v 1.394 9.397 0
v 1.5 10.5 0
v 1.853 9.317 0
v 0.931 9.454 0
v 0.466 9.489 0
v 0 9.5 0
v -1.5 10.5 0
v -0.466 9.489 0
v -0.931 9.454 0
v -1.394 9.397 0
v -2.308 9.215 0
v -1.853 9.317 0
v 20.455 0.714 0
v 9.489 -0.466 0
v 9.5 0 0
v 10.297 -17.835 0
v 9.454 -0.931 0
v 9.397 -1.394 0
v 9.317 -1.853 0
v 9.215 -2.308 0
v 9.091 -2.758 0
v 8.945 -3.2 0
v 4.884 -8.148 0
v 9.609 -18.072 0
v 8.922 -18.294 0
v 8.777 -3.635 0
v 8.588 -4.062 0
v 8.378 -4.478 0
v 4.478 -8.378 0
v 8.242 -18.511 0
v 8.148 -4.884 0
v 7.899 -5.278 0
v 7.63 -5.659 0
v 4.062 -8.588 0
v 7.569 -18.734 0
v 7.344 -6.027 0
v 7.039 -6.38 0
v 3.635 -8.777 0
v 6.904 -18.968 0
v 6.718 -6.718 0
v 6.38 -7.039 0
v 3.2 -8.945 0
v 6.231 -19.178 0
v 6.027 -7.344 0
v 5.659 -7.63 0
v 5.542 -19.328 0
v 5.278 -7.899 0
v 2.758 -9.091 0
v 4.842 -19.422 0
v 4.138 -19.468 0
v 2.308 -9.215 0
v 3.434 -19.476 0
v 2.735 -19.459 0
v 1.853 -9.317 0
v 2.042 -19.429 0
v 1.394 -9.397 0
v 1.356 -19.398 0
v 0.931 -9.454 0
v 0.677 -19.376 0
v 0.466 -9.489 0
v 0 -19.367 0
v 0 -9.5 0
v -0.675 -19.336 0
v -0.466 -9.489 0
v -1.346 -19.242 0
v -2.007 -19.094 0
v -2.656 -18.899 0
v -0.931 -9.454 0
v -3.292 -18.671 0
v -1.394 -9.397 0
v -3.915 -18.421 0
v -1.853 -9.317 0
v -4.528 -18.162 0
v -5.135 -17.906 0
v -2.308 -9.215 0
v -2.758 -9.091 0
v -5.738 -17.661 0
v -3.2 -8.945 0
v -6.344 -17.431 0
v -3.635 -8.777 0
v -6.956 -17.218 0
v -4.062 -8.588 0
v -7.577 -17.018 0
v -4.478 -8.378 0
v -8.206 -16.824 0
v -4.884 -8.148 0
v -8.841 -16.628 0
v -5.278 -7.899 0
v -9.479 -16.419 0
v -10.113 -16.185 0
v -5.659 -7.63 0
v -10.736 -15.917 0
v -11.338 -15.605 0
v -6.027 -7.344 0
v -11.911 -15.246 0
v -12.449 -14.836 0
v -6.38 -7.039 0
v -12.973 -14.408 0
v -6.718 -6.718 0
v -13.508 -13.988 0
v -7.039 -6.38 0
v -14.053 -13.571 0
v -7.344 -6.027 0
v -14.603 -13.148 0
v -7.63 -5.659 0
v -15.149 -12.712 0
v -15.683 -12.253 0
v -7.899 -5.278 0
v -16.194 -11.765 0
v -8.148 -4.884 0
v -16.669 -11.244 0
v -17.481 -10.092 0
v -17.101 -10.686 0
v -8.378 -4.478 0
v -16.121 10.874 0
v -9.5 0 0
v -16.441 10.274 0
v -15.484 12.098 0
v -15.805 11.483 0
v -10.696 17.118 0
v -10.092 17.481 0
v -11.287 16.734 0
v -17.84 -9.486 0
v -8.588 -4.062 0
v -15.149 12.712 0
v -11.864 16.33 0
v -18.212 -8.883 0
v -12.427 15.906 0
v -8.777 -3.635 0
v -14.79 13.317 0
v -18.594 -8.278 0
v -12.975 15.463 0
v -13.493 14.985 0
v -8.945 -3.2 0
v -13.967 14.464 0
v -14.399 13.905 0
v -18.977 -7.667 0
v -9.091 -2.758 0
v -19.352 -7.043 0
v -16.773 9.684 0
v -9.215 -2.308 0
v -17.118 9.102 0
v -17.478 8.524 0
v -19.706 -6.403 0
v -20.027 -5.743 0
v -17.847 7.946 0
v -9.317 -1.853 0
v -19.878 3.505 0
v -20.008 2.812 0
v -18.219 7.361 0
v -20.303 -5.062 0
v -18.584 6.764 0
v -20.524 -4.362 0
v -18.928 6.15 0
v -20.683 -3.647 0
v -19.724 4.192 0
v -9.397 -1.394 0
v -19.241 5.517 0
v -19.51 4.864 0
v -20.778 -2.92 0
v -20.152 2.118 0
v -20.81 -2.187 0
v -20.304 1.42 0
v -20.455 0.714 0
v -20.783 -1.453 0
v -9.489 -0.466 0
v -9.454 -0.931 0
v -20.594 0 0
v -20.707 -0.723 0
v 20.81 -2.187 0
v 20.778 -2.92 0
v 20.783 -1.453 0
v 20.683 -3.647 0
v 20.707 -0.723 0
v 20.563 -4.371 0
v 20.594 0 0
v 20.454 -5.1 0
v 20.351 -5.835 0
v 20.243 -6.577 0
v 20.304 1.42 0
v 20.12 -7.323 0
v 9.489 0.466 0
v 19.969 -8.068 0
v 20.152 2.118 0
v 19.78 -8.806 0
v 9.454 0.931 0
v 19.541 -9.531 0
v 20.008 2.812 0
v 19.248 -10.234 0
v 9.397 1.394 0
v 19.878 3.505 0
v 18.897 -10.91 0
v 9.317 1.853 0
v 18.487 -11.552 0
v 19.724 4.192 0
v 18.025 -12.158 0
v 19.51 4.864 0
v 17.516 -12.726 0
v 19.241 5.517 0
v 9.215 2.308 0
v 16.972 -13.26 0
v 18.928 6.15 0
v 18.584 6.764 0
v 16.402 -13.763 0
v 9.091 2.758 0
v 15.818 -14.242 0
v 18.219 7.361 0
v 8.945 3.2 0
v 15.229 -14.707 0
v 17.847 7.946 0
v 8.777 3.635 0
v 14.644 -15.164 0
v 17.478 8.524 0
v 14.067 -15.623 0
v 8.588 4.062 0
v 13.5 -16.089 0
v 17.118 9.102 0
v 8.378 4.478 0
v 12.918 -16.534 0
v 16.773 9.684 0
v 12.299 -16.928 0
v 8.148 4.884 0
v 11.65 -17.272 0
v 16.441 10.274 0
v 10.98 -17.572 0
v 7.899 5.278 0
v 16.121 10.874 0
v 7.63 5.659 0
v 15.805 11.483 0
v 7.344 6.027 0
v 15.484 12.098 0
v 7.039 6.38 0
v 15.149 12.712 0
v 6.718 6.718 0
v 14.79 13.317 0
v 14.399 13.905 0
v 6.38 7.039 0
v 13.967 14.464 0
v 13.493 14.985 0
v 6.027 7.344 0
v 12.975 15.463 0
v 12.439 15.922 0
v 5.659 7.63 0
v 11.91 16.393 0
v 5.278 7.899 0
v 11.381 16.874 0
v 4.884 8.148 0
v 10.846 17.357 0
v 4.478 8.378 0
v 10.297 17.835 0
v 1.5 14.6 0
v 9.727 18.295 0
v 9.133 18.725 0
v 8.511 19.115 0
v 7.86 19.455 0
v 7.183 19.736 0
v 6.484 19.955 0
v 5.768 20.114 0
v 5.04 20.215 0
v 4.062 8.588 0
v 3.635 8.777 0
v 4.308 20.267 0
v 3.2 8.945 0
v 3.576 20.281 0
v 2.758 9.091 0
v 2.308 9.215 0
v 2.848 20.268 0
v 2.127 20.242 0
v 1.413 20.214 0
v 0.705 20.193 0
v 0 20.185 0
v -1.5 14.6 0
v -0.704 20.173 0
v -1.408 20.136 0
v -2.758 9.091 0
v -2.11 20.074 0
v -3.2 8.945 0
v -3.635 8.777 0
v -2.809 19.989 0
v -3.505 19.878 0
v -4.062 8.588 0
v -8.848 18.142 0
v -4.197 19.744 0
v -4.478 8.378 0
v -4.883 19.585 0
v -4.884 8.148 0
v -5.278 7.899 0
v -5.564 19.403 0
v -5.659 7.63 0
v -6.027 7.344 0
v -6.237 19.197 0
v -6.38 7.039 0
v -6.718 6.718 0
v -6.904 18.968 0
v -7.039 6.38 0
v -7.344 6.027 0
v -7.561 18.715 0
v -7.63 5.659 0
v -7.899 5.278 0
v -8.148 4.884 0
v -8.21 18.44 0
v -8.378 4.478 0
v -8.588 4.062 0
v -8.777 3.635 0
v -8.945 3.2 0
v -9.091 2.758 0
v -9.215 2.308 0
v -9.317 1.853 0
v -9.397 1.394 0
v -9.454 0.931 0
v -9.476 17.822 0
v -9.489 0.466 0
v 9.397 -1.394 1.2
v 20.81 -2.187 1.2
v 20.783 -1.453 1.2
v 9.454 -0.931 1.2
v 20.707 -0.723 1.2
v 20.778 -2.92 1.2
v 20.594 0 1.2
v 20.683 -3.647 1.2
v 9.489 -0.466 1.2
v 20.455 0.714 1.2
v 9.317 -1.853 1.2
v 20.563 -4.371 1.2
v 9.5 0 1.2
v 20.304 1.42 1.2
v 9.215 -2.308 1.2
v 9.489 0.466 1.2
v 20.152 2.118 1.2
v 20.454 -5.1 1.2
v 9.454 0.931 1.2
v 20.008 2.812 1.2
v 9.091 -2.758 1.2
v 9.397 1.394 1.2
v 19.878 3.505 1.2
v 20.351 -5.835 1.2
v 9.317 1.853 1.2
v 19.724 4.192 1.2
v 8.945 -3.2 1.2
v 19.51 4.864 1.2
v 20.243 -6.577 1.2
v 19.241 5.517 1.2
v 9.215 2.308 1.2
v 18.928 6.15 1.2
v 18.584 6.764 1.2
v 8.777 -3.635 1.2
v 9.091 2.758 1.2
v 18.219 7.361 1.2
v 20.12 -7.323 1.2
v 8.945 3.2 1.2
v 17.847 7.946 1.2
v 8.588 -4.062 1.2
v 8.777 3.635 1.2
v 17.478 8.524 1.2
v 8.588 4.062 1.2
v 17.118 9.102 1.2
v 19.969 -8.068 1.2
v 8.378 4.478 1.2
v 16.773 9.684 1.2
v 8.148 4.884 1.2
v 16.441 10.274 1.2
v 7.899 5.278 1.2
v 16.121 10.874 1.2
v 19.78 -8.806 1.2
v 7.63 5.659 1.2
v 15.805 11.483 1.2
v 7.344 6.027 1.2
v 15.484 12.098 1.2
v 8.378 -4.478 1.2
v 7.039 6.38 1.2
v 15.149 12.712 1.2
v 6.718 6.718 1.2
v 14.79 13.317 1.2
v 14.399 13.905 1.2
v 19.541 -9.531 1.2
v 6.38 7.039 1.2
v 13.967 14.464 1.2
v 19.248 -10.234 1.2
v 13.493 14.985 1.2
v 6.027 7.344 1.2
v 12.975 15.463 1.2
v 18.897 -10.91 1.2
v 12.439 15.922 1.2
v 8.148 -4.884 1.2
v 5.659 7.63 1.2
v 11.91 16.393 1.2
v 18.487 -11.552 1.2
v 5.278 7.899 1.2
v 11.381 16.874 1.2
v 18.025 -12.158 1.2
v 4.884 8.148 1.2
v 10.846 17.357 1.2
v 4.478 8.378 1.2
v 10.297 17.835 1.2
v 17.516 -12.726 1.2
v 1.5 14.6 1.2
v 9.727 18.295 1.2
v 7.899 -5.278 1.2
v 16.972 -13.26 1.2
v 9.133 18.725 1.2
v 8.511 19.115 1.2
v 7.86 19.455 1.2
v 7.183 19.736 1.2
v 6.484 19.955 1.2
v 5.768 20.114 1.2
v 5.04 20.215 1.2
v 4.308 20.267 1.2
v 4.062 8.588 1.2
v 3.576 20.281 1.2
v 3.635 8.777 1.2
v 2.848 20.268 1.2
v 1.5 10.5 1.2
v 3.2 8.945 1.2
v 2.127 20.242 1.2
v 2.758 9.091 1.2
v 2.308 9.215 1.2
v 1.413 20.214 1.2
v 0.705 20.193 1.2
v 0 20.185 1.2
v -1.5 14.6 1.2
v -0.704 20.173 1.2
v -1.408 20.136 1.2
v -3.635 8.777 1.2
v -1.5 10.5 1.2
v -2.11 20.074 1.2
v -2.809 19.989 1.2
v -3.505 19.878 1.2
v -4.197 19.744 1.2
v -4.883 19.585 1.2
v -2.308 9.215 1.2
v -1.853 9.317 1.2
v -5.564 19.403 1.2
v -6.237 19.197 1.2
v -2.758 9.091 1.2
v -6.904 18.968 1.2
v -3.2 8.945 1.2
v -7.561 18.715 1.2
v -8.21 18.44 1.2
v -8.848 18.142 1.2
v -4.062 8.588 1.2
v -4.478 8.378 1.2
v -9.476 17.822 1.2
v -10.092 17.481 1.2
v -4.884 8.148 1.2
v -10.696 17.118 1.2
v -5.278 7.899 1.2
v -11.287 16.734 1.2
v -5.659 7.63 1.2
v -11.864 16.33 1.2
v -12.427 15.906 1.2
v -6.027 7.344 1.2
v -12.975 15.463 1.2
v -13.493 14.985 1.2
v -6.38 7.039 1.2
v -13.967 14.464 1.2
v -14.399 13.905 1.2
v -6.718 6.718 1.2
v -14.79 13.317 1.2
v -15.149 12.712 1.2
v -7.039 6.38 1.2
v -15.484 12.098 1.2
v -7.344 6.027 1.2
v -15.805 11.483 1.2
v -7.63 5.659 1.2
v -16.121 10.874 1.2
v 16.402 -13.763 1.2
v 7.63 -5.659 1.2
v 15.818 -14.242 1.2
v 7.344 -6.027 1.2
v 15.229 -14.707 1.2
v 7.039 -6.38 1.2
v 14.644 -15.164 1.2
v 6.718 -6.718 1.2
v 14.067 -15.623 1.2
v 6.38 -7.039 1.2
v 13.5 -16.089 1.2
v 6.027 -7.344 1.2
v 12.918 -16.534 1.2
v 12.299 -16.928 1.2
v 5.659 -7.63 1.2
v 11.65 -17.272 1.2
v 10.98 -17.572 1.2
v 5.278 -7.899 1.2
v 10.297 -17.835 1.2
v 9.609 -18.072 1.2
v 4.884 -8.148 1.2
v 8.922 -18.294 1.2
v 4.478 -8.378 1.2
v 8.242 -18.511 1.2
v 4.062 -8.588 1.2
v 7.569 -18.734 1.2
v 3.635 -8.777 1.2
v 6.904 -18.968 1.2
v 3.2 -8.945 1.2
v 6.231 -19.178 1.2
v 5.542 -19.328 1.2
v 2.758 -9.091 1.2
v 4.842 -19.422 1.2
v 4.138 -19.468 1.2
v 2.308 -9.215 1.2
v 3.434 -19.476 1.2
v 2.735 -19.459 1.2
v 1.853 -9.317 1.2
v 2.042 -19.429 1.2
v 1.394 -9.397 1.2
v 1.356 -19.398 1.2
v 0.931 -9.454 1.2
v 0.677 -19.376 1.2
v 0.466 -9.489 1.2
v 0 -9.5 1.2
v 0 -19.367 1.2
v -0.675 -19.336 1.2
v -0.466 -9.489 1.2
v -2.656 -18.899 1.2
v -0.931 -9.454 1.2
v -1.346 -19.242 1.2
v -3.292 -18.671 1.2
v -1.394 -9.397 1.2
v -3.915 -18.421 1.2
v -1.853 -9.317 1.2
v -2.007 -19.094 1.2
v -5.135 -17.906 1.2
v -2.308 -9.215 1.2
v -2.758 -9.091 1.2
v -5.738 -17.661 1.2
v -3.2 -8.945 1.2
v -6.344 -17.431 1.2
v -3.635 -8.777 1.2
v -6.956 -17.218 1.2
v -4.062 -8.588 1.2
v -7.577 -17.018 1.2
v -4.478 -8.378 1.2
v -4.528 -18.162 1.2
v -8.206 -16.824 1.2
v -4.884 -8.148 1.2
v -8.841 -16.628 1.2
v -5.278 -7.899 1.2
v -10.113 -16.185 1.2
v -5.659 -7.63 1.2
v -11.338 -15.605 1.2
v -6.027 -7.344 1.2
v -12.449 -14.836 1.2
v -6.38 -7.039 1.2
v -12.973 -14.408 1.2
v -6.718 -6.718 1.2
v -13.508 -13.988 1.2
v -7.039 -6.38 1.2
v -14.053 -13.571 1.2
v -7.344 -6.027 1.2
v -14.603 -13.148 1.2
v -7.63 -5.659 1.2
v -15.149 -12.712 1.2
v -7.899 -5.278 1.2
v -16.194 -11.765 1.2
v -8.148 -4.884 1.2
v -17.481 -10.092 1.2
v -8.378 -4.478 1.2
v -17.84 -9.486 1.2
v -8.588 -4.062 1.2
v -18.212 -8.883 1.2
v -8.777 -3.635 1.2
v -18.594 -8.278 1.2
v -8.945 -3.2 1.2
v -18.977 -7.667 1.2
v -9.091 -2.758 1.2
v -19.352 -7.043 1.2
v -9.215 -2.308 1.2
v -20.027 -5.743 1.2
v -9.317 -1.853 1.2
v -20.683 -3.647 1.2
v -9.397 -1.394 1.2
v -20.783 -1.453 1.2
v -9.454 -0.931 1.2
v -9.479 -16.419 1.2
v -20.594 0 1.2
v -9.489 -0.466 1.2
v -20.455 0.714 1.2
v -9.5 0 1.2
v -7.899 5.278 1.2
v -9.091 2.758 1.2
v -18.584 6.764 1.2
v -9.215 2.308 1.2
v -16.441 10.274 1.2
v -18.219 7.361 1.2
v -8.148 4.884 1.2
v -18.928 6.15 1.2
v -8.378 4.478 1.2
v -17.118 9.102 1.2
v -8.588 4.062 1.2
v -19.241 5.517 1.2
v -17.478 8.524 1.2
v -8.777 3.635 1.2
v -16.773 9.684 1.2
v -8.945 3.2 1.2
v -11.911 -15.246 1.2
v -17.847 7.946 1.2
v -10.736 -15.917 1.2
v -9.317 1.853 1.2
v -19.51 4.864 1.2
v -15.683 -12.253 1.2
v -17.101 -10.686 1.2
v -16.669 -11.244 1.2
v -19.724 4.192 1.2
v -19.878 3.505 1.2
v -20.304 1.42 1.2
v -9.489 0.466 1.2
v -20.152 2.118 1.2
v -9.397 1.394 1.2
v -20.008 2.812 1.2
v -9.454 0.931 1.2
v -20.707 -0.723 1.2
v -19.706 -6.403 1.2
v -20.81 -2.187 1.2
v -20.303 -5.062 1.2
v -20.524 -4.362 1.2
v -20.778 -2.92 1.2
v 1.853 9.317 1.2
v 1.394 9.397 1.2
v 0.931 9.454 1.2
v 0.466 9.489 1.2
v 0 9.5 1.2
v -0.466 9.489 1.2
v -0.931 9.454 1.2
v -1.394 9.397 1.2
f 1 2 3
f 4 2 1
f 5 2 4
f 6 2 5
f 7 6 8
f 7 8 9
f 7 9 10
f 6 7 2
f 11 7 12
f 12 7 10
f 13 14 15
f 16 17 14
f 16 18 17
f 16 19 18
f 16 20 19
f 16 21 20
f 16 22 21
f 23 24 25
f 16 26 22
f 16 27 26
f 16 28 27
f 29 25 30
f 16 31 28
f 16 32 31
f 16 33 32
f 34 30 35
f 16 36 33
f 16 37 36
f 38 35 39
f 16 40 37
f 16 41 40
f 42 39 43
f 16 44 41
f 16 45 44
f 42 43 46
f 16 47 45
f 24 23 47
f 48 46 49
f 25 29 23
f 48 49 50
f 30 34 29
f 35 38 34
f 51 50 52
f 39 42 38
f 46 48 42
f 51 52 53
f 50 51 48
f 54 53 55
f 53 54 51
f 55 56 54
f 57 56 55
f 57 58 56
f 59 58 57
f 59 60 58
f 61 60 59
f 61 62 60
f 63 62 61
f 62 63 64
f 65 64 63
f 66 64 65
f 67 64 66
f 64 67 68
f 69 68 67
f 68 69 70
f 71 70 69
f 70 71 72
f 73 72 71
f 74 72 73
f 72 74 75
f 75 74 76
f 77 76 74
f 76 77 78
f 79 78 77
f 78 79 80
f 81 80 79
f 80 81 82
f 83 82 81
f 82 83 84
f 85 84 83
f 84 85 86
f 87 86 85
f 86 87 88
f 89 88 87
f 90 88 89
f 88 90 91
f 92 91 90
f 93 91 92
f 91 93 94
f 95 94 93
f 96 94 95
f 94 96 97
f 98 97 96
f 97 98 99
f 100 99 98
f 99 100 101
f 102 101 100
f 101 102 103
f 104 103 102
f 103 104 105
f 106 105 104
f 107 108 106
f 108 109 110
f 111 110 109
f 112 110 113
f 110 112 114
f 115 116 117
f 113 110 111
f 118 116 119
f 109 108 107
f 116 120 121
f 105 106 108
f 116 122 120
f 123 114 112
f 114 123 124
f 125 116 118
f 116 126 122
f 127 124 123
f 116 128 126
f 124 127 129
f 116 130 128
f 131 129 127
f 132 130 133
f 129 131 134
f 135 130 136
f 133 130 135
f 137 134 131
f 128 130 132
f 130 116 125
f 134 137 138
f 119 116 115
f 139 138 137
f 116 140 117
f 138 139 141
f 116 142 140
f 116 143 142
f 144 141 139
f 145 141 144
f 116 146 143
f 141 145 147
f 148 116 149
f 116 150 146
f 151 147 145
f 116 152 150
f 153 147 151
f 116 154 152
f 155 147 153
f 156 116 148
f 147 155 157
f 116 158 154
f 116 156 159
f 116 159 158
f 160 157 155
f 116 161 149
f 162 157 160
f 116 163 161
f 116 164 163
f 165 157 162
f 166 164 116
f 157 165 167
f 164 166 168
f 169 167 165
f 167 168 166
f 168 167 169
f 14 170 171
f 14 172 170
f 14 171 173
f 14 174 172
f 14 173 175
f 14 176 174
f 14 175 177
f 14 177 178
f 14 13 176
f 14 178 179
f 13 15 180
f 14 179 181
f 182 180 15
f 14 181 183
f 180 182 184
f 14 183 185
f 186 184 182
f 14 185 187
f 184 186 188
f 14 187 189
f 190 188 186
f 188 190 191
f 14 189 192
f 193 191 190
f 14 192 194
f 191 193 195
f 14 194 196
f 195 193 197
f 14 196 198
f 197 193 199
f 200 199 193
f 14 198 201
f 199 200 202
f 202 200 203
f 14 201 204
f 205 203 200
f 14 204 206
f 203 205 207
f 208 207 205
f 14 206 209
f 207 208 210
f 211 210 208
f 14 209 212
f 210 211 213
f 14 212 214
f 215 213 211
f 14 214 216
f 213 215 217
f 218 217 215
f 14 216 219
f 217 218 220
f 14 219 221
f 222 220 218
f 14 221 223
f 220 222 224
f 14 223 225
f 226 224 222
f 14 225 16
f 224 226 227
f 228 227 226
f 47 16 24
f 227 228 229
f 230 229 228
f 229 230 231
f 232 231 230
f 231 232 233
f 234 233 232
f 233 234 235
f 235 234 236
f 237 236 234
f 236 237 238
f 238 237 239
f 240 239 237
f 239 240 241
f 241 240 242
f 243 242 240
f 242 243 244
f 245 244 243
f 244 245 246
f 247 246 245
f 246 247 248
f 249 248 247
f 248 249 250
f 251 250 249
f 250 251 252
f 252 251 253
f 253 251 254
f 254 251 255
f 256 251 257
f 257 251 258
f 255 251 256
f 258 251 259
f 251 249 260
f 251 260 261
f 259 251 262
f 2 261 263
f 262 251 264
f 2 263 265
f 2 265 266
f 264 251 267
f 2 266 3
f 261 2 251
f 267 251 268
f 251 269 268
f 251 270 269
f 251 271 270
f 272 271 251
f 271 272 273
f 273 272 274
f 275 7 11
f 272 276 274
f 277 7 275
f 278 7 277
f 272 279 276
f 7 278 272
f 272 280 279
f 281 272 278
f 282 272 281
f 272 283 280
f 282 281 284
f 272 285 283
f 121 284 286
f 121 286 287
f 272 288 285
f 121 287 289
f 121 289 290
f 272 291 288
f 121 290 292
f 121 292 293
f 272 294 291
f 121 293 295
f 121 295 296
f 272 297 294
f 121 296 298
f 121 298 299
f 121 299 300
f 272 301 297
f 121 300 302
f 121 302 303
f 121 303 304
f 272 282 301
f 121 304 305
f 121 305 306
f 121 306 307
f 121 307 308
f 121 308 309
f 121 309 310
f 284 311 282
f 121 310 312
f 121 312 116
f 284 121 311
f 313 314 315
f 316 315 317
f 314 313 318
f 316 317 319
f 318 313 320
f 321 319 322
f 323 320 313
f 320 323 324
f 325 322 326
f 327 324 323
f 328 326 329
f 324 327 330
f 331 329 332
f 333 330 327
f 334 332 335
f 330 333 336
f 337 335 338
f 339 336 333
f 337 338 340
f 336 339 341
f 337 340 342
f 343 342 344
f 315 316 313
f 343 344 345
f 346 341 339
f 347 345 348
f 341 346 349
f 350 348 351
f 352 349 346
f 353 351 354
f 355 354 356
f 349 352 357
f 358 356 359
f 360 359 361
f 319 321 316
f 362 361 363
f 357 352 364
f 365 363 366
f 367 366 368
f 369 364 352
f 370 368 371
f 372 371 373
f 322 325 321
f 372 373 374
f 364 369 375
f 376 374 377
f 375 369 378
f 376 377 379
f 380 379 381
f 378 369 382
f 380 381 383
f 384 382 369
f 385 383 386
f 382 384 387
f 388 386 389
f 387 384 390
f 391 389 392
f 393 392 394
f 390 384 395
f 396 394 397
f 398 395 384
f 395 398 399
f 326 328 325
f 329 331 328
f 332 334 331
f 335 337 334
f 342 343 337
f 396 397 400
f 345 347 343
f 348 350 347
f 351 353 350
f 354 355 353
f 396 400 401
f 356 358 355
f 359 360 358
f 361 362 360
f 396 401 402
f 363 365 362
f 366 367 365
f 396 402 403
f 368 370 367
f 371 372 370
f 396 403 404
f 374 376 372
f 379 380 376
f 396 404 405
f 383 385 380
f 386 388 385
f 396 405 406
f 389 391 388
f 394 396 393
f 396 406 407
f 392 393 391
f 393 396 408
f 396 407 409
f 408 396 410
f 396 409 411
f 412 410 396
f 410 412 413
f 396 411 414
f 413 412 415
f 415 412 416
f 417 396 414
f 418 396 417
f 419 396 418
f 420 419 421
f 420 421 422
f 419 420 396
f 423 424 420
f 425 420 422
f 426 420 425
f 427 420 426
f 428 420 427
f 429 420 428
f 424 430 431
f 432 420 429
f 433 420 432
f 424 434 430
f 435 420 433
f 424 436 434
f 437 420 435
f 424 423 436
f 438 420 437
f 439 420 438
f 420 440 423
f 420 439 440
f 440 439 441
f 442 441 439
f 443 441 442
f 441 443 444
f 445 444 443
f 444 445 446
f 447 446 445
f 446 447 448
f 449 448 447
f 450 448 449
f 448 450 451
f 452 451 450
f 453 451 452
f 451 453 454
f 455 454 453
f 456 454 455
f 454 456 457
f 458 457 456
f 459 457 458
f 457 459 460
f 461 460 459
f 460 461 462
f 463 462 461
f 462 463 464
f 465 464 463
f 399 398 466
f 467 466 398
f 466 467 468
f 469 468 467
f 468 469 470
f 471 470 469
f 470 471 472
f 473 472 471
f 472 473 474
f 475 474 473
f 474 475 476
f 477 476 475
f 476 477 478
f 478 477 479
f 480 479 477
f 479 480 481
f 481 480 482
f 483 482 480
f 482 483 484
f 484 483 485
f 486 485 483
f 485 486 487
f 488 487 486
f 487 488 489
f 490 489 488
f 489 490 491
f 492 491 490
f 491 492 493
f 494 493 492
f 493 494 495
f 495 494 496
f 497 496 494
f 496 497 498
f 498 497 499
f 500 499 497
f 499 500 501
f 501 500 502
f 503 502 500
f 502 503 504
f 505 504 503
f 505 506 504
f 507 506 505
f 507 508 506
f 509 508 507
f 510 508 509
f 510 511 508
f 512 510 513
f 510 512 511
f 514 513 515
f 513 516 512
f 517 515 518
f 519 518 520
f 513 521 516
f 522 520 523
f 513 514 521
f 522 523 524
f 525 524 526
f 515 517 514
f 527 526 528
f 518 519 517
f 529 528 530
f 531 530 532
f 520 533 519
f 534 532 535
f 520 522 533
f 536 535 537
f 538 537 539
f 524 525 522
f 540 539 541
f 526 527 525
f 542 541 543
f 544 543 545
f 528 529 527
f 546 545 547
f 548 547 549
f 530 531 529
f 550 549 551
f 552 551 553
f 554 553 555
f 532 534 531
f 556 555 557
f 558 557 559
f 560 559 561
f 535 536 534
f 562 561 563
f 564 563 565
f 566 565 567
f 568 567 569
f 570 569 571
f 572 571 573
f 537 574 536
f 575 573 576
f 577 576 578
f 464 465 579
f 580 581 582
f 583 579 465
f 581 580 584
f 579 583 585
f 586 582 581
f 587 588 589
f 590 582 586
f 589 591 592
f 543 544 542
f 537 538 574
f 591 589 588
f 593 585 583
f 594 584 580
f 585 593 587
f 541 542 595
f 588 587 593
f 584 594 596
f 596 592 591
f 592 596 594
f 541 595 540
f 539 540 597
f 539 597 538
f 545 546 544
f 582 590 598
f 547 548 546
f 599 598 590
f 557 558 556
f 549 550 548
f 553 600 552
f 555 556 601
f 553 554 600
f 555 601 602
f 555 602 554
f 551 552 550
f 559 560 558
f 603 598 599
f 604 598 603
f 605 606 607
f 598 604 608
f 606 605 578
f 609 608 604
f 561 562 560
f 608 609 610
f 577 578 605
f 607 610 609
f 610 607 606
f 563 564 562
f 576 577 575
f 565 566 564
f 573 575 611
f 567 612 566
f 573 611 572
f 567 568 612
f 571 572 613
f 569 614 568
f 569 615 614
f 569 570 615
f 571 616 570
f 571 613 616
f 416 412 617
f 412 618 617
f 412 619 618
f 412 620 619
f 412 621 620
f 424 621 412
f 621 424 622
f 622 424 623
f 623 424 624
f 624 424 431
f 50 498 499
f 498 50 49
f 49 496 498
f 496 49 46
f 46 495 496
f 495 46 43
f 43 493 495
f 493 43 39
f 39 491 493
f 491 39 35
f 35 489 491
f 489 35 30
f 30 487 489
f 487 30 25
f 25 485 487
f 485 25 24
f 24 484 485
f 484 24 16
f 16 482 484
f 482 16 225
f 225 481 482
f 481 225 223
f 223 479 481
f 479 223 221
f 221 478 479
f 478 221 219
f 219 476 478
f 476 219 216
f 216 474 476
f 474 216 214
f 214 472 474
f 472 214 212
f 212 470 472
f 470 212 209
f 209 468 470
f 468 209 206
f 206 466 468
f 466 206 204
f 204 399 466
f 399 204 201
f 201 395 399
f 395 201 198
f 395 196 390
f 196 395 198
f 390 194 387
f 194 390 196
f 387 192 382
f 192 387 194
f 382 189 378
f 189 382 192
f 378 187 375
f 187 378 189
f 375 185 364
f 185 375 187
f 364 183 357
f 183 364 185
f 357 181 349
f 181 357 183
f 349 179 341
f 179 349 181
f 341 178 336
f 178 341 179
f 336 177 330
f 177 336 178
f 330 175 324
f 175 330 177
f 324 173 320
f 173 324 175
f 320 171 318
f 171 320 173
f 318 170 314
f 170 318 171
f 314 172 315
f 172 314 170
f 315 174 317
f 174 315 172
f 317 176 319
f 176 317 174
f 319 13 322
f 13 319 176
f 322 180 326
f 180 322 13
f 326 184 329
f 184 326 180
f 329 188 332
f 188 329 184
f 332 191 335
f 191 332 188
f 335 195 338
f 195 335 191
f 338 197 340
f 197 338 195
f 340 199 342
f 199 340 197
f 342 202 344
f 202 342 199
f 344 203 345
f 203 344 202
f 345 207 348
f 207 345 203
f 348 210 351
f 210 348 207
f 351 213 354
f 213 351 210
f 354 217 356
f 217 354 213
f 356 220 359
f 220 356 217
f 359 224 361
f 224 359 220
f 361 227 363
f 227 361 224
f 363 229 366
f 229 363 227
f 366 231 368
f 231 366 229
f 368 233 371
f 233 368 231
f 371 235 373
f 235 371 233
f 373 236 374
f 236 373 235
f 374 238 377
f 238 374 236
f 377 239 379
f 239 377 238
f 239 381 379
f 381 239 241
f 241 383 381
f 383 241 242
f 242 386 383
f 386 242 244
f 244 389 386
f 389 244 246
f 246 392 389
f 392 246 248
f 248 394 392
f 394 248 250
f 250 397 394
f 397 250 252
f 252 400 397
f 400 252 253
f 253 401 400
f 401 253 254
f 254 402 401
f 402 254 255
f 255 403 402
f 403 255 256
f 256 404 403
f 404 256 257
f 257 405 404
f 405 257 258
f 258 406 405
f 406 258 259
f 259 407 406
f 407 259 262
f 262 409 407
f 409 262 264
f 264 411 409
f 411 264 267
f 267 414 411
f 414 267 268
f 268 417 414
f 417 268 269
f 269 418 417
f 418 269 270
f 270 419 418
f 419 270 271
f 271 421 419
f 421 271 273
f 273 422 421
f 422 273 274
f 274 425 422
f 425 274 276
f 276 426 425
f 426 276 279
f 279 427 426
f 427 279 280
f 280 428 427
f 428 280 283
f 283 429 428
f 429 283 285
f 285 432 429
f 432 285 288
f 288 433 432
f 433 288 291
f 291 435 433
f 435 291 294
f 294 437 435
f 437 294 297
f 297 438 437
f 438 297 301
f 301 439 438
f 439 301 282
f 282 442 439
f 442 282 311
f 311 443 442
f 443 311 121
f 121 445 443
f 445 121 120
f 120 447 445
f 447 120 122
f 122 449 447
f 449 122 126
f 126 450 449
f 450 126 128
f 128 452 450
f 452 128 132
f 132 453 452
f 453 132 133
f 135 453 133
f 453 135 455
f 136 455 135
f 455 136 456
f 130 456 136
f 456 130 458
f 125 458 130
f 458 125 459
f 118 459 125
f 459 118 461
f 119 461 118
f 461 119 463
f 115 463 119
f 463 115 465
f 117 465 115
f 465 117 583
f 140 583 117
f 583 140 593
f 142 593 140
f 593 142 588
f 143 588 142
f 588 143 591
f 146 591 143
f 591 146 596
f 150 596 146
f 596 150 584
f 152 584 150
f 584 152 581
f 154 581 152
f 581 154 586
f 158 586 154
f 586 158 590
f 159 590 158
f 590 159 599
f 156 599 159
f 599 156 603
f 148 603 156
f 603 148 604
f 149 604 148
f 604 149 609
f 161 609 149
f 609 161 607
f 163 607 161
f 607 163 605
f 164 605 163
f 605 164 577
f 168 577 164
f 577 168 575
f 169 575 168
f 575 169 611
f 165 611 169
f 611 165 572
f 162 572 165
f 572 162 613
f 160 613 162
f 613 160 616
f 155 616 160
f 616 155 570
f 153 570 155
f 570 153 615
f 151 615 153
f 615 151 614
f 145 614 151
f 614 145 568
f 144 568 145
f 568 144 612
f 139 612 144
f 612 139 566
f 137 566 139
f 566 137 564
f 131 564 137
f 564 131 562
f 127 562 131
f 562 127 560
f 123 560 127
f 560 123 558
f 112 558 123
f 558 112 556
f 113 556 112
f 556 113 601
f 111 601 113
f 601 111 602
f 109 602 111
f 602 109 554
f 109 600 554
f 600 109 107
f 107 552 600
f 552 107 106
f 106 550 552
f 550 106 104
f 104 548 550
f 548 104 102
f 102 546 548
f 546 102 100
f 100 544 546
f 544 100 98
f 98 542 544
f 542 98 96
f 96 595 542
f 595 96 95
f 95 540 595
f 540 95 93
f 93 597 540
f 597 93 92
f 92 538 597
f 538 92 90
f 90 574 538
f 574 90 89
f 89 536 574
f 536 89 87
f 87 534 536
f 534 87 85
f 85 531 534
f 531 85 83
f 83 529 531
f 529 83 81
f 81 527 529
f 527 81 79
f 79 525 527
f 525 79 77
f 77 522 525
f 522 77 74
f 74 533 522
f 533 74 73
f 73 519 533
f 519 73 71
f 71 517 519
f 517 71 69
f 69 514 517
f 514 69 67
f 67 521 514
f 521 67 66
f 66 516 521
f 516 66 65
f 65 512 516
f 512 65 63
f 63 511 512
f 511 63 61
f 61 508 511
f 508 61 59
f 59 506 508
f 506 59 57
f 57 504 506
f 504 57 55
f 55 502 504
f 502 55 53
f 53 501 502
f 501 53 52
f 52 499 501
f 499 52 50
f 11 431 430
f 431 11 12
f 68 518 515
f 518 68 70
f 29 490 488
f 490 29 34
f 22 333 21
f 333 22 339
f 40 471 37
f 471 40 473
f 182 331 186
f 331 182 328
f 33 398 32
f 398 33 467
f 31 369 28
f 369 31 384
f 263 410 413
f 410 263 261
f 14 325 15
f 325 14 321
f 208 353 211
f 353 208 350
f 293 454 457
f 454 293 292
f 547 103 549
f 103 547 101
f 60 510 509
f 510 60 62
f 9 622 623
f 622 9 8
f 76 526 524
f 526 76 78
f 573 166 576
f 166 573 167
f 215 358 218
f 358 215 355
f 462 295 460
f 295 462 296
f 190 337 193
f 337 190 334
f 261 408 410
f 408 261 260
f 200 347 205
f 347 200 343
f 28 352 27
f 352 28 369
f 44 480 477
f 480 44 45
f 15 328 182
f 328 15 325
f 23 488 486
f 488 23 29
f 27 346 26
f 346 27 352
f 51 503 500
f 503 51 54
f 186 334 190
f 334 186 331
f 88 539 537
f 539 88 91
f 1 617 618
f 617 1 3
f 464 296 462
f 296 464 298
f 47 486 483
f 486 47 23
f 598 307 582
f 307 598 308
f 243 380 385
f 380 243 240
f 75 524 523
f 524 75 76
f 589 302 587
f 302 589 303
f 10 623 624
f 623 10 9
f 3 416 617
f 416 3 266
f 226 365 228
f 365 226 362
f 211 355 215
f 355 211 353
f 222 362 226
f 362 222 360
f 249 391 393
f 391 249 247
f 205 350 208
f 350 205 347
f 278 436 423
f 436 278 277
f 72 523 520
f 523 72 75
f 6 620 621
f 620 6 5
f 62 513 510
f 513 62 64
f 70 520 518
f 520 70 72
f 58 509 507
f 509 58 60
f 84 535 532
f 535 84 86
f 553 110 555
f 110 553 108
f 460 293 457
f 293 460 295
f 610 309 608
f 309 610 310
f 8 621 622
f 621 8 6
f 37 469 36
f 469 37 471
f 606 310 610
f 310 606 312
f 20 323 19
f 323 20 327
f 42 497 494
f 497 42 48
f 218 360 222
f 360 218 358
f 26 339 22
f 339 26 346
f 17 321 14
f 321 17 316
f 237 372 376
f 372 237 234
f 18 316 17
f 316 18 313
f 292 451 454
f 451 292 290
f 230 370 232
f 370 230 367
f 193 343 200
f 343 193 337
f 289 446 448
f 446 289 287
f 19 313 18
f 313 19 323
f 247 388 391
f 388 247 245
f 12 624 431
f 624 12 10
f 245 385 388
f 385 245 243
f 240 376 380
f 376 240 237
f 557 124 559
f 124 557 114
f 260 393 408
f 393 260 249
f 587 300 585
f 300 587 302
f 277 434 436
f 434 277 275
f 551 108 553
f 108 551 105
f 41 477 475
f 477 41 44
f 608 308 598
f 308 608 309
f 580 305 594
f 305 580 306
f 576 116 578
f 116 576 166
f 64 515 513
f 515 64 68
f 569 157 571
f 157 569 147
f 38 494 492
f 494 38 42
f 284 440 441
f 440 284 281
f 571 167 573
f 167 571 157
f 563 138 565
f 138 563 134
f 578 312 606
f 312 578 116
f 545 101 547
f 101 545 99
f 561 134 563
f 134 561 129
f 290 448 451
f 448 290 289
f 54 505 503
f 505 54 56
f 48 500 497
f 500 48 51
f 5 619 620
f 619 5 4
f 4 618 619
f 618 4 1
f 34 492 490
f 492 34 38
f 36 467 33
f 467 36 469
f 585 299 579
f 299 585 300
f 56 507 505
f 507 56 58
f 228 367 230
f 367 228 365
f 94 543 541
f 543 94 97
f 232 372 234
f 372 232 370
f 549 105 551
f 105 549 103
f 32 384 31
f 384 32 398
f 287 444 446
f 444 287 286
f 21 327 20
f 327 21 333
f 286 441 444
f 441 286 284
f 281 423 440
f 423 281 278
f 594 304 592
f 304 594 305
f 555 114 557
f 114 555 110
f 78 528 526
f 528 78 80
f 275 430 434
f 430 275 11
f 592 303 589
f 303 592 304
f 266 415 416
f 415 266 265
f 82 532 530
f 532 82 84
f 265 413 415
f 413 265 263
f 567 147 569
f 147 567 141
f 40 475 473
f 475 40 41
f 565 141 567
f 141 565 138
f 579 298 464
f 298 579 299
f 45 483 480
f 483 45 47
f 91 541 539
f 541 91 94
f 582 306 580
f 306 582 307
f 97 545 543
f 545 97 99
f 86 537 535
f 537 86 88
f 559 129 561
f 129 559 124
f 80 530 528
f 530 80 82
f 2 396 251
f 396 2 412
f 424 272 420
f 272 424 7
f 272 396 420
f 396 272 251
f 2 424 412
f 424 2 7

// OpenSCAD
/*
  Elna Supermatic cam 16
  Name: Source profile 16
  Status: source-profile

  Generated from measured parametric base v2.
  Surface mode: smooth
*/

include <_elna_measured_common.scad>;

profile_points = [
        [0.0000, 20.1850],
        [0.7051, 20.1927],
        [1.4135, 20.2137],
        [2.1275, 20.2420],
        [2.8485, 20.2683],
        [3.5761, 20.2809],
        [4.3079, 20.2673],
        [5.0402, 20.2151],
        [5.7676, 20.1139],
        [6.4839, 19.9555],
        [7.1833, 19.7359],
        [7.8602, 19.4546],
        [8.5107, 19.1154],
        [9.1330, 18.7255],
        [9.7275, 18.2947],
        [10.2969, 17.8347],
        [10.8461, 17.3574],
        [11.3815, 16.8738],
        [11.9103, 16.3932],
        [12.4394, 15.9218],
        [12.9747, 15.4626],
        [13.4930, 14.9855],
        [13.9675, 14.4637],
        [14.3987, 13.9046],
        [14.7905, 13.3174],
        [15.1495, 12.7119],
        [15.4844, 12.0977],
        [15.8050, 11.4830],
        [16.1211, 10.8738],
        [16.4415, 10.2738],
        [16.7727, 9.6838],
        [17.1182, 9.1019],
        [17.4776, 8.5244],
        [17.8470, 7.9460],
        [18.2191, 7.3610],
        [18.5836, 6.7639],
        [18.9285, 6.1502],
        [19.2411, 5.5173],
        [19.5097, 4.8643],
        [19.7243, 4.1925],
        [19.8783, 3.5051],
        [20.0084, 2.8120],
        [20.1521, 2.1181],
        [20.3039, 1.4198],
        [20.4550, 0.7143],
        [20.5938, 0.0000],
        [20.7074, -0.7231],
        [20.7833, -1.4533],
        [20.8098, -2.1872],
        [20.7783, -2.9202],
        [20.6834, -3.6470],
        [20.5631, -4.3708],
        [20.4544, -5.0999],
        [20.3509, -5.8355],
        [20.2432, -6.5774],
        [20.1200, -7.3231],
        [19.9693, -8.0681],
        [19.7796, -8.8065],
        [19.5415, -9.5310],
        [19.2483, -10.2345],
        [18.8967, -10.9100],
        [18.4874, -11.5522],
        [18.0249, -12.1579],
        [17.5164, -12.7264],
        [16.9718, -13.2598],
        [16.4020, -13.7629],
        [15.8178, -14.2424],
        [15.2291, -14.7066],
        [14.6438, -15.1641],
        [14.0668, -15.6228],
        [13.5001, -16.0888],
        [12.9181, -16.5344],
        [12.2991, -16.9282],
        [11.6502, -17.2722],
        [10.9800, -17.5716],
        [10.2969, -17.8347],
        [9.6089, -18.0717],
        [8.9224, -18.2936],
        [8.2417, -18.5112],
        [7.5689, -18.7338],
        [6.9037, -18.9677],
        [6.2313, -19.1780],
        [5.5422, -19.3280],
        [4.8424, -19.4219],
        [4.1380, -19.4676],
        [3.4341, -19.4758],
        [2.7347, -19.4587],
        [2.0421, -19.4290],
        [1.3565, -19.3982],
        [0.6766, -19.3757],
        [0.0000, -19.3675],
        [-0.6752, -19.3357],
        [-1.3456, -19.2424],
        [-2.0068, -19.0938],
        [-2.6561, -18.8993],
        [-3.2922, -18.6707],
        [-3.9155, -18.4209],
        [-4.5284, -18.1625],
        [-5.1346, -17.9064],
        [-5.7384, -17.6611],
        [-6.3445, -17.4313],
        [-6.9564, -17.2178],
        [-7.5767, -17.0176],
        [-8.2056, -16.8241],
        [-8.8413, -16.6281],
        [-9.4794, -16.4188],
        [-10.1135, -16.1850],
        [-10.7359, -15.9167],
        [-11.3380, -15.6055],
        [-11.9115, -15.2460],
        [-12.4492, -14.8364],
        [-12.9728, -14.4077],
        [-13.5080, -13.9880],
        [-14.0530, -13.5708],
        [-14.6028, -13.1484],
        [-15.1495, -12.7119],
        [-15.6834, -12.2532],
        [-16.1937, -11.7654],
        [-16.6694, -11.2437],
        [-17.1009, -10.6858],
        [-17.4807, -10.0925],
        [-17.8400, -9.4857],
        [-18.2123, -8.8827],
        [-18.5938, -8.2785],
        [-18.9771, -7.6672],
        [-19.3518, -7.0435],
        [-19.7059, -6.4029],
        [-20.0269, -5.7426],
        [-20.3029, -5.0621],
        [-20.5240, -4.3625],
        [-20.6834, -3.6470],
        [-20.7783, -2.9202],
        [-20.8098, -2.1872],
        [-20.7833, -1.4533],
        [-20.7074, -0.7231],
        [-20.5938, -0.0000],
        [-20.4550, 0.7143],
        [-20.3039, 1.4198],
        [-20.1521, 2.1181],
        [-20.0084, 2.8120],
        [-19.8783, 3.5051],
        [-19.7243, 4.1925],
        [-19.5097, 4.8643],
        [-19.2411, 5.5173],
        [-18.9285, 6.1502],
        [-18.5836, 6.7639],
        [-18.2191, 7.3610],
        [-17.8470, 7.9460],
        [-17.4776, 8.5244],
        [-17.1182, 9.1019],
        [-16.7727, 9.6838],
        [-16.4415, 10.2738],
        [-16.1211, 10.8738],
        [-15.8050, 11.4830],
        [-15.4844, 12.0977],
        [-15.1495, 12.7119],
        [-14.7905, 13.3174],
        [-14.3987, 13.9046],
        [-13.9675, 14.4637],
        [-13.4930, 14.9855],
        [-12.9747, 15.4626],
        [-12.4271, 15.9060],
        [-11.8644, 16.3300],
        [-11.2873, 16.7341],
        [-10.6964, 17.1179],
        [-10.0925, 17.4807],
        [-9.4763, 17.8223],
        [-8.8485, 18.1422],
        [-8.2100, 18.4399],
        [-7.5614, 18.7152],
        [-6.9037, 18.9677],
        [-6.2375, 19.1971],
        [-5.5637, 19.4031],
        [-4.8832, 19.5854],
        [-4.1967, 19.7439],
        [-3.5051, 19.8783],
        [-2.8092, 19.9886],
        [-2.1099, 20.0744],
        [-1.4080, 20.1358],
        [-0.7044, 20.1727]
];

icon_points = [[-1.000,0.500], [-0.956,0.599], [-0.911,0.691], [-0.867,0.768], [-0.822,0.824], [-0.778,0.855], [-0.733,0.858], [-0.689,0.834], [-0.644,0.784], [-0.600,0.712], [-0.556,0.623], [-0.511,0.525], [-0.467,0.425], [-0.422,0.331], [-0.378,0.250], [-0.333,0.188], [-0.289,0.151], [-0.244,0.140], [-0.200,0.158], [-0.156,0.202], [-0.111,0.269], [-0.067,0.354], [-0.022,0.450], [0.022,0.550], [0.067,0.646], [0.111,0.731], [0.156,0.798], [0.200,0.842], [0.244,0.860], [0.289,0.849], [0.333,0.812], [0.378,0.750], [0.422,0.669], [0.467,0.575], [0.511,0.475], [0.556,0.377], [0.600,0.288], [0.644,0.216], [0.689,0.166], [0.733,0.142], [0.778,0.145], [0.822,0.176], [0.867,0.232], [0.911,0.309], [0.956,0.401], [1.000,0.500]];

elna_cam_ring(profile_points=profile_points);
